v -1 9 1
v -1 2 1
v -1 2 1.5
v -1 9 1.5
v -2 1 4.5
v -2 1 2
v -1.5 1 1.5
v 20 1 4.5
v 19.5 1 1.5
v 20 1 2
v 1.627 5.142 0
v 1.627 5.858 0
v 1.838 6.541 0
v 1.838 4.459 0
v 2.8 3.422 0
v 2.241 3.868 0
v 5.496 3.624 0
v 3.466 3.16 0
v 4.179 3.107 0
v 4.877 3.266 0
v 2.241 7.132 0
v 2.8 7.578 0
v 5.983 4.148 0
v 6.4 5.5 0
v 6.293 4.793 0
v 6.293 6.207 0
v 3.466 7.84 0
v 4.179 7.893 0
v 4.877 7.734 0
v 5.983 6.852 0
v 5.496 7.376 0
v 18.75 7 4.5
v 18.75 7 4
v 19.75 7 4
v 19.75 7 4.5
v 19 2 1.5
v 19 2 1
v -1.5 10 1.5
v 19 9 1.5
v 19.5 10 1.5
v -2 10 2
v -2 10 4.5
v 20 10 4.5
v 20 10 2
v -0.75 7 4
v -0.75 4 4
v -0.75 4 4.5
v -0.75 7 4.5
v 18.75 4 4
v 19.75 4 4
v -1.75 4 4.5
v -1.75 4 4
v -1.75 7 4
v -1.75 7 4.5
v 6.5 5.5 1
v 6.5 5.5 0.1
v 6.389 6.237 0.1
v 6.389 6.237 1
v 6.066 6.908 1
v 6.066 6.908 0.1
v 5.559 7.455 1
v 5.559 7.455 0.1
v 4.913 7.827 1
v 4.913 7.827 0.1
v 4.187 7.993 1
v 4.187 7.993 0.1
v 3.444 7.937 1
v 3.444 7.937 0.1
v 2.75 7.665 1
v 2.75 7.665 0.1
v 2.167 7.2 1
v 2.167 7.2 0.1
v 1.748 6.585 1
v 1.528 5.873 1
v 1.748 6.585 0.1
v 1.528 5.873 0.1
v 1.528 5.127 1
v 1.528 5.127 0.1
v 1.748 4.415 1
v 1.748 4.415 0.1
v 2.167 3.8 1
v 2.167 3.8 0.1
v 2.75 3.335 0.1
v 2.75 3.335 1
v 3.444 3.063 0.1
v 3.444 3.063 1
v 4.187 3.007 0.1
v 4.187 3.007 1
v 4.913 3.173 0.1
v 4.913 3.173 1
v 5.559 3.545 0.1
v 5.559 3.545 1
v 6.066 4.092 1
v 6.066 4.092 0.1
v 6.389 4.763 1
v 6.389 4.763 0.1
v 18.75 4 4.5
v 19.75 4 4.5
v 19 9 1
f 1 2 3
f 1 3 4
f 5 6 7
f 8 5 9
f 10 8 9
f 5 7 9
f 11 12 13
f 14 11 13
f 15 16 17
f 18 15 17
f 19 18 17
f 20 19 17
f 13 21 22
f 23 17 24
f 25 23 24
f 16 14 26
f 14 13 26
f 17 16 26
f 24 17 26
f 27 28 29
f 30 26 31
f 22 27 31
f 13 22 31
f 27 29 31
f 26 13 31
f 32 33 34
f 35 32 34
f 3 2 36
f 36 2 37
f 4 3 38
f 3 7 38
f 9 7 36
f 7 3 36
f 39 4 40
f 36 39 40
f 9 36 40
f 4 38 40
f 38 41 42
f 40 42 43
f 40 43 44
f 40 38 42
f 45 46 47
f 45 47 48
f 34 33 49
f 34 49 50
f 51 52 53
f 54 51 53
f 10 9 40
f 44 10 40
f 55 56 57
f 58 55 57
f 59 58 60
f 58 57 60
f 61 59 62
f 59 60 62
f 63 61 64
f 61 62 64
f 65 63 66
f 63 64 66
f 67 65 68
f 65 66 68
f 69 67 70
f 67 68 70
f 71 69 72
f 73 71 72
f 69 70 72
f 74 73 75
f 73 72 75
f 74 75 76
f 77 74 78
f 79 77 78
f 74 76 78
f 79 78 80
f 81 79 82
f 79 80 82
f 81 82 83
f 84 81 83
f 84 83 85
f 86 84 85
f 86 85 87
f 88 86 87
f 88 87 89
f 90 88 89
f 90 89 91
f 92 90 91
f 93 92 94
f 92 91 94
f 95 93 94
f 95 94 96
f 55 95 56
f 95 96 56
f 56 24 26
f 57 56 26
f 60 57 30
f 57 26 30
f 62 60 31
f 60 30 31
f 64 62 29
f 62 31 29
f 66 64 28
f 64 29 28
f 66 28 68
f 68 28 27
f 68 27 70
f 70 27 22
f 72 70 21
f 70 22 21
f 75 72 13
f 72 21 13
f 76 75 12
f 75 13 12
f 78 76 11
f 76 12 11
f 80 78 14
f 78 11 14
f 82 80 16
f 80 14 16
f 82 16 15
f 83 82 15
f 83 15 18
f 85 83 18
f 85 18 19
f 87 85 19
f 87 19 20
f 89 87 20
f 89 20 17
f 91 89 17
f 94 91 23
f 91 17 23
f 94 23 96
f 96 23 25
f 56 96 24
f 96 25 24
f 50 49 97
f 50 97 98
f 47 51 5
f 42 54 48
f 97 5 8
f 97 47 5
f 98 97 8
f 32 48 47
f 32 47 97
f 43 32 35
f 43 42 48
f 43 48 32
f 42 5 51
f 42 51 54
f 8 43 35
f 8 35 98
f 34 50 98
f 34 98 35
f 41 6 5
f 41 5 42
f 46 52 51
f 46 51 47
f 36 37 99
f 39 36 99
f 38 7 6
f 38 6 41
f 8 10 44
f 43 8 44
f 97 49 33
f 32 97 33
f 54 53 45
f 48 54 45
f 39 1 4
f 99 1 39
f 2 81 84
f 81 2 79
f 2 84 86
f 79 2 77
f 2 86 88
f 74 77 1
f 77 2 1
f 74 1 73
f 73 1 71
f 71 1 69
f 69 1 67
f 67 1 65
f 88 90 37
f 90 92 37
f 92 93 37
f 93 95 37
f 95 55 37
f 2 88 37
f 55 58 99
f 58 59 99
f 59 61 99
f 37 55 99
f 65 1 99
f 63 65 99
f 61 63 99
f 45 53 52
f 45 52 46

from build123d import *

# Parameters (mm, degrees)
SKETCH003_R      = 2.5
EXTRUDE003_DEPTH = 1
CHAMFER_SIZE     = 0.1
SKETCH006_W      = 20
SKETCH006_H      = 7
EXTRUDE018_DEPTH = 0.5
SKETCH001_W      = 1
SKETCH001_H      = 3
EXTRUDE001_DEPTH = 1
SKETCH002_W      = 1
SKETCH002_H      = 3
EXTRUDE002_DEPTH = 1
SKETCH_W         = 22
SKETCH_H         = 9
EXTRUDE_DEPTH    = 3
CHAMFER001_SIZE  = 0.5


with BuildPart() as chamfer001:
    # Sketch003 → Extrude003 (new body)
    with BuildSketch(Plane(origin=(-0.5, 0, 0), x_dir=(1, 0, 0), z_dir=(0, 0, 1))):
        with Locations((6.5, 5.5)):
            Circle(SKETCH003_R)
    extrude(amount=EXTRUDE003_DEPTH)

    # Chamfer
    chamfer_edges = [chamfer001.edges().sort_by_distance(p)[0] for p in [
        (3.5, 5.5, 0),
    ]]
    chamfer(chamfer_edges, length=CHAMFER_SIZE)


with BuildPart() as chamfer001_1:
    # Chamfer placement: moved
    add(chamfer001.part.moved(Location((-2, 0, 0))))


with BuildPart() as fusion020:
    # Sketch006 → Extrude018 (new body)
    with BuildSketch(Plane.XY.offset(1)):
        with Locations((9, 5.5)):
            Rectangle(SKETCH006_W, SKETCH006_H)
    extrude(amount=EXTRUDE018_DEPTH)

    # Fusion020: union Chamfer001
    add(chamfer001_1.part)


with BuildPart() as extrude001:
    # Sketch001 → Extrude001 (new body)
    with BuildSketch(Plane(origin=(0, 1, 4), x_dir=(1, 0, 0), z_dir=(0, 0, 1))):
        with Locations((0.75, 4.5)):
            Rectangle(SKETCH001_W, SKETCH001_H)
    extrude(amount=EXTRUDE001_DEPTH)


with BuildPart() as extrude001_1:
    # Extrude001 placement: moved
    add(extrude001.part.moved(Location((-2, 0, 0))))


with BuildPart() as fusion:
    # Sketch002 → Extrude002 (new body)
    with BuildSketch(Plane(origin=(18.5, 1, 4), x_dir=(1, 0, 0), z_dir=(0, 0, 1))):
        with Locations((0.75, 4.5)):
            Rectangle(SKETCH002_W, SKETCH002_H)
    extrude(amount=EXTRUDE002_DEPTH)

    # Fusion: union Extrude001
    add(extrude001_1.part)


with BuildPart() as body:
    # Sketch → Extrude (new body)
    with BuildSketch(Plane.XY.offset(1.5)):
        with Locations((9, 5.5)):
            Rectangle(SKETCH_W, SKETCH_H)
    extrude(amount=EXTRUDE_DEPTH)

    # Chamfer001
    chamfer001_edges = [body.edges().sort_by_distance(p)[0] for p in [
        (20, 5.5, 1.5),
        (-2, 5.5, 1.5),
    ]]
    chamfer(chamfer001_edges, length=CHAMFER001_SIZE)

    # Cut: cut Fusion
    add(fusion.part, mode=Mode.SUBTRACT)

    # Fusion021: union Fusion020
    add(fusion020.part)


solid = body.part
